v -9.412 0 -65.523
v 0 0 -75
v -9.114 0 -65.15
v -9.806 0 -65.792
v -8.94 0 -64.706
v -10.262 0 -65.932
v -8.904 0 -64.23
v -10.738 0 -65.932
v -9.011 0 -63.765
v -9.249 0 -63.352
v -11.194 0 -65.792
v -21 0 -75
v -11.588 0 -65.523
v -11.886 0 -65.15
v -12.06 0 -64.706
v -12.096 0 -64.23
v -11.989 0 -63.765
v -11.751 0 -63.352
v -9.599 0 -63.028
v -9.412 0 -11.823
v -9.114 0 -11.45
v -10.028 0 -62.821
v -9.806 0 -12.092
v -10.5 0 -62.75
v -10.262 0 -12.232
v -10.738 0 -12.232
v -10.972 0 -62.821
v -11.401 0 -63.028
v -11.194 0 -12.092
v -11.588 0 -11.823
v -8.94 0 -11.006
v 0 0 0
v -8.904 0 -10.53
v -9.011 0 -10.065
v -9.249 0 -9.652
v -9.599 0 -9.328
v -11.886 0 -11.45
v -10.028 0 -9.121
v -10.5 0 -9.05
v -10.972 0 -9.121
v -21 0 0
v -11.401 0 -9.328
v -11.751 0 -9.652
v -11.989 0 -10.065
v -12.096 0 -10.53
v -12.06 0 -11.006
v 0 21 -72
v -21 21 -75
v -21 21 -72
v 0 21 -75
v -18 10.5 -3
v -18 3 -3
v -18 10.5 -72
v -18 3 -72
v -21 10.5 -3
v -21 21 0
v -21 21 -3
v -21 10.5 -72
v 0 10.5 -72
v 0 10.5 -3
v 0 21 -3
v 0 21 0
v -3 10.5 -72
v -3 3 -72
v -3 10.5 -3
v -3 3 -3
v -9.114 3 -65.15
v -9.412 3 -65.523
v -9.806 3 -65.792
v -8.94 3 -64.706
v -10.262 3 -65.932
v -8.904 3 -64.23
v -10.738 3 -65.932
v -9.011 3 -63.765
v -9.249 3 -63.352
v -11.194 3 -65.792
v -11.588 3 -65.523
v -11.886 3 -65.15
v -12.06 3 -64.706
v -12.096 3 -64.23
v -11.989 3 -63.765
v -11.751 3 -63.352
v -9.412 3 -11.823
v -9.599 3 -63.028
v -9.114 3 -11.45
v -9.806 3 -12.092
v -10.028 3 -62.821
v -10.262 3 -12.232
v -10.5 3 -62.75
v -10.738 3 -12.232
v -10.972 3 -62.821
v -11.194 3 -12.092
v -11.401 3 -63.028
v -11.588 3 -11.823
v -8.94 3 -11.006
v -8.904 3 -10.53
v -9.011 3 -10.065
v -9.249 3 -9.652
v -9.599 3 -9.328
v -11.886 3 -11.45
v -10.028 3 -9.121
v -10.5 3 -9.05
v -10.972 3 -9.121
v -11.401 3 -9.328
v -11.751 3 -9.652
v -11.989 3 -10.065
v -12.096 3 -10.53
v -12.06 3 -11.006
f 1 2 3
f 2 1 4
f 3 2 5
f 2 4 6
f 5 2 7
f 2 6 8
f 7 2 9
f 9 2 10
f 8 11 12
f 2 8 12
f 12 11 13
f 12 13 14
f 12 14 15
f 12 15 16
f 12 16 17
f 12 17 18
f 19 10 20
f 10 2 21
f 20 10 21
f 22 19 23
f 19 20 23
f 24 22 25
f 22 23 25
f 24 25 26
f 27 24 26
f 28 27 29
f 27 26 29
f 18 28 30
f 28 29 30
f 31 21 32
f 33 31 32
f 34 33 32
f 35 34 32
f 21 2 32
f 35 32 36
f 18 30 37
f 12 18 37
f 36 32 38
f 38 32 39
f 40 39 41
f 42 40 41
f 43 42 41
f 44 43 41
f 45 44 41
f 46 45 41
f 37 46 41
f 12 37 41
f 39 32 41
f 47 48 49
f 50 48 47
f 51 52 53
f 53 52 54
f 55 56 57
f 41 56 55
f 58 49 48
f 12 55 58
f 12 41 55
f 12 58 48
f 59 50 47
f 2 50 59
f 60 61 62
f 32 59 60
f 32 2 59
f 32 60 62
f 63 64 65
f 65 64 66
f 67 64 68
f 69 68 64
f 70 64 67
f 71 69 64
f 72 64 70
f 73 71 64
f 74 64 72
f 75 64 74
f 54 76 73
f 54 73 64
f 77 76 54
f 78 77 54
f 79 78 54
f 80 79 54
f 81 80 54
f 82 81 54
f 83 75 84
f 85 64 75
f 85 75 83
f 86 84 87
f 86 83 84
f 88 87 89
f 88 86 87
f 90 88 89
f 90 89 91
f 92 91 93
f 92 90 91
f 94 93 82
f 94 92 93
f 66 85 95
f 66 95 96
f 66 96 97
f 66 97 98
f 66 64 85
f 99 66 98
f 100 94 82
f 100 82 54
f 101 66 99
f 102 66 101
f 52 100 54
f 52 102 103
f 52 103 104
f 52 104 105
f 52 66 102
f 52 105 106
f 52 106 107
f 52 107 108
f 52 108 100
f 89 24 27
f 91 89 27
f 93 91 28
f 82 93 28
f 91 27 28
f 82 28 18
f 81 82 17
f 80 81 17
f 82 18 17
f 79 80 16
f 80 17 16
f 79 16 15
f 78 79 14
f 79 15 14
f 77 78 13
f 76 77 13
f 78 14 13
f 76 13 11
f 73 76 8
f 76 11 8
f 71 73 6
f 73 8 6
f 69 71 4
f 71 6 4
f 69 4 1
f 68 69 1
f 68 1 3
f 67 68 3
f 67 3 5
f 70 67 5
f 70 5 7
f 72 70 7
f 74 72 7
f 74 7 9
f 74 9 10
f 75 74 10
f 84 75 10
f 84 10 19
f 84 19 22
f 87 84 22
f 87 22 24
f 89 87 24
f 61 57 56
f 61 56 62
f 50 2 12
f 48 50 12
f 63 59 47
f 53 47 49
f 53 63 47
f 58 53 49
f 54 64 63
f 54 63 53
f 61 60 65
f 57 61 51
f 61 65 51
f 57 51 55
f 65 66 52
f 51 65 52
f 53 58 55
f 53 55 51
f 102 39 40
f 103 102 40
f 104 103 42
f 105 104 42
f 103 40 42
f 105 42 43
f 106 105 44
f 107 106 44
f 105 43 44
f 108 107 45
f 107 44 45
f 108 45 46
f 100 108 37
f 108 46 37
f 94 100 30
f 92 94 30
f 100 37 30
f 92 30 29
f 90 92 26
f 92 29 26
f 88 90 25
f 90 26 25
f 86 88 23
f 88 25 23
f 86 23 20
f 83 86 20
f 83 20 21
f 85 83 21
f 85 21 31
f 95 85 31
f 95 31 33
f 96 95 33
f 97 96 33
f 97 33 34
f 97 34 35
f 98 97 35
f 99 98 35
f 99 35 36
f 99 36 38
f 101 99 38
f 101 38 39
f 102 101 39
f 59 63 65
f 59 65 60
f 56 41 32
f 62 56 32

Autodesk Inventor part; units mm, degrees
ref_plane "YZ Plane" through (0, 0, 0) normal (1, 0, 0) x (0, 1, 0)
ref_plane "XZ Plane" through (0, 0, 0) normal (0, 1, 0) x (-1, 0, 0)
ref_plane "XY Plane" through (0, 0, 0) normal (0, 0, 1) x (1, 0, 0)
sketch "スケッチ1" plane through (0, 0, 0) normal (0, 1, 0) x (-1, 0, 0)
  line L0 (0, 0) -> (21, 0)
  line L1 (21, 0) -> (21, -75)
  line L2 (21, -75) -> (0, -75)
  line L3 (0, -75) -> (0, 0)
  dimension "d0" = 21
  dimension "d3" = 75
extrude "押し出し1" add sketch "スケッチ1" along normal blind 3
sketch "スケッチ2" plane through (0, 3, 0) normal (0, 1, 0) x (1, 0, 0)
  line L0 (-21, 0) -> (0, 0) projected
  line L1 (0, 75) -> (-21, 75) projected
  line L2 (-21, 75) -> (-21, 0) projected
  point P0 (-10.5, 10.65)
  point P1 (-10.5, 64.35)
  dimension "d4" = 53.7
  dimension "d5" = 10.65
  dimension "d7" = 10.5
hole "穴1" at (-10.5, 3, -10.65) at (-10.5, 3, -64.35) direction (0, -1, 0) diameter 3.2 end through all
sketch "スケッチ3" plane through (0, 3, 0) normal (0, 1, 0) x (1, 0, 0)
  line L0 (0, 75) -> (-21, 75) projected
  line L1 (-21, 0) -> (0, 0) projected
  line L2 (-21, 75) -> (0, 75)
  line L3 (0, 75) -> (0, 0)
  line L4 (0, 0) -> (-21, 0)
  line L5 (-21, 0) -> (-21, 75)
  line L6 (-18, 72) -> (-3, 72)
  line L7 (-3, 72) -> (-3, 3)
  line L8 (-3, 3) -> (-18, 3)
  line L9 (-18, 3) -> (-18, 72)
  dimension "d15" = 3
  dimension "d16" = 3
  dimension "d17" = 3
  dimension "d18" = 3
extrude "押し出し2" add sketch "スケッチ3" along normal blind 7.5
sketch "スケッチ4" plane through (0, 10.5, 0) normal (0, 1, 0) x (1, 0, 0)
  line L0 (0, 75) -> (-21, 75) projected
  line L1 (0, 0) -> (0, 75) projected
  line L2 (-21, 75) -> (0, 75)
  line L3 (0, 75) -> (0, 72)
  line L4 (0, 72) -> (-21, 72)
  line L5 (-21, 72) -> (-21, 75)
  line L6 (-21, 75) -> (-21, 0) projected
  line L7 (-21, 0) -> (0, 0)
  line L8 (0, 0) -> (0, 3)
  line L9 (0, 3) -> (-21, 3)
  line L10 (-21, 3) -> (-21, 0)
  dimension "d21" = 3
  dimension "d22" = 3
extrude "押し出し3" add sketch "スケッチ4" along normal blind 10.5 contours L1 L4 L5 L0 | L1 L7 L6 L9
properties part number "batteryBox" material "ポリプロピレン"
